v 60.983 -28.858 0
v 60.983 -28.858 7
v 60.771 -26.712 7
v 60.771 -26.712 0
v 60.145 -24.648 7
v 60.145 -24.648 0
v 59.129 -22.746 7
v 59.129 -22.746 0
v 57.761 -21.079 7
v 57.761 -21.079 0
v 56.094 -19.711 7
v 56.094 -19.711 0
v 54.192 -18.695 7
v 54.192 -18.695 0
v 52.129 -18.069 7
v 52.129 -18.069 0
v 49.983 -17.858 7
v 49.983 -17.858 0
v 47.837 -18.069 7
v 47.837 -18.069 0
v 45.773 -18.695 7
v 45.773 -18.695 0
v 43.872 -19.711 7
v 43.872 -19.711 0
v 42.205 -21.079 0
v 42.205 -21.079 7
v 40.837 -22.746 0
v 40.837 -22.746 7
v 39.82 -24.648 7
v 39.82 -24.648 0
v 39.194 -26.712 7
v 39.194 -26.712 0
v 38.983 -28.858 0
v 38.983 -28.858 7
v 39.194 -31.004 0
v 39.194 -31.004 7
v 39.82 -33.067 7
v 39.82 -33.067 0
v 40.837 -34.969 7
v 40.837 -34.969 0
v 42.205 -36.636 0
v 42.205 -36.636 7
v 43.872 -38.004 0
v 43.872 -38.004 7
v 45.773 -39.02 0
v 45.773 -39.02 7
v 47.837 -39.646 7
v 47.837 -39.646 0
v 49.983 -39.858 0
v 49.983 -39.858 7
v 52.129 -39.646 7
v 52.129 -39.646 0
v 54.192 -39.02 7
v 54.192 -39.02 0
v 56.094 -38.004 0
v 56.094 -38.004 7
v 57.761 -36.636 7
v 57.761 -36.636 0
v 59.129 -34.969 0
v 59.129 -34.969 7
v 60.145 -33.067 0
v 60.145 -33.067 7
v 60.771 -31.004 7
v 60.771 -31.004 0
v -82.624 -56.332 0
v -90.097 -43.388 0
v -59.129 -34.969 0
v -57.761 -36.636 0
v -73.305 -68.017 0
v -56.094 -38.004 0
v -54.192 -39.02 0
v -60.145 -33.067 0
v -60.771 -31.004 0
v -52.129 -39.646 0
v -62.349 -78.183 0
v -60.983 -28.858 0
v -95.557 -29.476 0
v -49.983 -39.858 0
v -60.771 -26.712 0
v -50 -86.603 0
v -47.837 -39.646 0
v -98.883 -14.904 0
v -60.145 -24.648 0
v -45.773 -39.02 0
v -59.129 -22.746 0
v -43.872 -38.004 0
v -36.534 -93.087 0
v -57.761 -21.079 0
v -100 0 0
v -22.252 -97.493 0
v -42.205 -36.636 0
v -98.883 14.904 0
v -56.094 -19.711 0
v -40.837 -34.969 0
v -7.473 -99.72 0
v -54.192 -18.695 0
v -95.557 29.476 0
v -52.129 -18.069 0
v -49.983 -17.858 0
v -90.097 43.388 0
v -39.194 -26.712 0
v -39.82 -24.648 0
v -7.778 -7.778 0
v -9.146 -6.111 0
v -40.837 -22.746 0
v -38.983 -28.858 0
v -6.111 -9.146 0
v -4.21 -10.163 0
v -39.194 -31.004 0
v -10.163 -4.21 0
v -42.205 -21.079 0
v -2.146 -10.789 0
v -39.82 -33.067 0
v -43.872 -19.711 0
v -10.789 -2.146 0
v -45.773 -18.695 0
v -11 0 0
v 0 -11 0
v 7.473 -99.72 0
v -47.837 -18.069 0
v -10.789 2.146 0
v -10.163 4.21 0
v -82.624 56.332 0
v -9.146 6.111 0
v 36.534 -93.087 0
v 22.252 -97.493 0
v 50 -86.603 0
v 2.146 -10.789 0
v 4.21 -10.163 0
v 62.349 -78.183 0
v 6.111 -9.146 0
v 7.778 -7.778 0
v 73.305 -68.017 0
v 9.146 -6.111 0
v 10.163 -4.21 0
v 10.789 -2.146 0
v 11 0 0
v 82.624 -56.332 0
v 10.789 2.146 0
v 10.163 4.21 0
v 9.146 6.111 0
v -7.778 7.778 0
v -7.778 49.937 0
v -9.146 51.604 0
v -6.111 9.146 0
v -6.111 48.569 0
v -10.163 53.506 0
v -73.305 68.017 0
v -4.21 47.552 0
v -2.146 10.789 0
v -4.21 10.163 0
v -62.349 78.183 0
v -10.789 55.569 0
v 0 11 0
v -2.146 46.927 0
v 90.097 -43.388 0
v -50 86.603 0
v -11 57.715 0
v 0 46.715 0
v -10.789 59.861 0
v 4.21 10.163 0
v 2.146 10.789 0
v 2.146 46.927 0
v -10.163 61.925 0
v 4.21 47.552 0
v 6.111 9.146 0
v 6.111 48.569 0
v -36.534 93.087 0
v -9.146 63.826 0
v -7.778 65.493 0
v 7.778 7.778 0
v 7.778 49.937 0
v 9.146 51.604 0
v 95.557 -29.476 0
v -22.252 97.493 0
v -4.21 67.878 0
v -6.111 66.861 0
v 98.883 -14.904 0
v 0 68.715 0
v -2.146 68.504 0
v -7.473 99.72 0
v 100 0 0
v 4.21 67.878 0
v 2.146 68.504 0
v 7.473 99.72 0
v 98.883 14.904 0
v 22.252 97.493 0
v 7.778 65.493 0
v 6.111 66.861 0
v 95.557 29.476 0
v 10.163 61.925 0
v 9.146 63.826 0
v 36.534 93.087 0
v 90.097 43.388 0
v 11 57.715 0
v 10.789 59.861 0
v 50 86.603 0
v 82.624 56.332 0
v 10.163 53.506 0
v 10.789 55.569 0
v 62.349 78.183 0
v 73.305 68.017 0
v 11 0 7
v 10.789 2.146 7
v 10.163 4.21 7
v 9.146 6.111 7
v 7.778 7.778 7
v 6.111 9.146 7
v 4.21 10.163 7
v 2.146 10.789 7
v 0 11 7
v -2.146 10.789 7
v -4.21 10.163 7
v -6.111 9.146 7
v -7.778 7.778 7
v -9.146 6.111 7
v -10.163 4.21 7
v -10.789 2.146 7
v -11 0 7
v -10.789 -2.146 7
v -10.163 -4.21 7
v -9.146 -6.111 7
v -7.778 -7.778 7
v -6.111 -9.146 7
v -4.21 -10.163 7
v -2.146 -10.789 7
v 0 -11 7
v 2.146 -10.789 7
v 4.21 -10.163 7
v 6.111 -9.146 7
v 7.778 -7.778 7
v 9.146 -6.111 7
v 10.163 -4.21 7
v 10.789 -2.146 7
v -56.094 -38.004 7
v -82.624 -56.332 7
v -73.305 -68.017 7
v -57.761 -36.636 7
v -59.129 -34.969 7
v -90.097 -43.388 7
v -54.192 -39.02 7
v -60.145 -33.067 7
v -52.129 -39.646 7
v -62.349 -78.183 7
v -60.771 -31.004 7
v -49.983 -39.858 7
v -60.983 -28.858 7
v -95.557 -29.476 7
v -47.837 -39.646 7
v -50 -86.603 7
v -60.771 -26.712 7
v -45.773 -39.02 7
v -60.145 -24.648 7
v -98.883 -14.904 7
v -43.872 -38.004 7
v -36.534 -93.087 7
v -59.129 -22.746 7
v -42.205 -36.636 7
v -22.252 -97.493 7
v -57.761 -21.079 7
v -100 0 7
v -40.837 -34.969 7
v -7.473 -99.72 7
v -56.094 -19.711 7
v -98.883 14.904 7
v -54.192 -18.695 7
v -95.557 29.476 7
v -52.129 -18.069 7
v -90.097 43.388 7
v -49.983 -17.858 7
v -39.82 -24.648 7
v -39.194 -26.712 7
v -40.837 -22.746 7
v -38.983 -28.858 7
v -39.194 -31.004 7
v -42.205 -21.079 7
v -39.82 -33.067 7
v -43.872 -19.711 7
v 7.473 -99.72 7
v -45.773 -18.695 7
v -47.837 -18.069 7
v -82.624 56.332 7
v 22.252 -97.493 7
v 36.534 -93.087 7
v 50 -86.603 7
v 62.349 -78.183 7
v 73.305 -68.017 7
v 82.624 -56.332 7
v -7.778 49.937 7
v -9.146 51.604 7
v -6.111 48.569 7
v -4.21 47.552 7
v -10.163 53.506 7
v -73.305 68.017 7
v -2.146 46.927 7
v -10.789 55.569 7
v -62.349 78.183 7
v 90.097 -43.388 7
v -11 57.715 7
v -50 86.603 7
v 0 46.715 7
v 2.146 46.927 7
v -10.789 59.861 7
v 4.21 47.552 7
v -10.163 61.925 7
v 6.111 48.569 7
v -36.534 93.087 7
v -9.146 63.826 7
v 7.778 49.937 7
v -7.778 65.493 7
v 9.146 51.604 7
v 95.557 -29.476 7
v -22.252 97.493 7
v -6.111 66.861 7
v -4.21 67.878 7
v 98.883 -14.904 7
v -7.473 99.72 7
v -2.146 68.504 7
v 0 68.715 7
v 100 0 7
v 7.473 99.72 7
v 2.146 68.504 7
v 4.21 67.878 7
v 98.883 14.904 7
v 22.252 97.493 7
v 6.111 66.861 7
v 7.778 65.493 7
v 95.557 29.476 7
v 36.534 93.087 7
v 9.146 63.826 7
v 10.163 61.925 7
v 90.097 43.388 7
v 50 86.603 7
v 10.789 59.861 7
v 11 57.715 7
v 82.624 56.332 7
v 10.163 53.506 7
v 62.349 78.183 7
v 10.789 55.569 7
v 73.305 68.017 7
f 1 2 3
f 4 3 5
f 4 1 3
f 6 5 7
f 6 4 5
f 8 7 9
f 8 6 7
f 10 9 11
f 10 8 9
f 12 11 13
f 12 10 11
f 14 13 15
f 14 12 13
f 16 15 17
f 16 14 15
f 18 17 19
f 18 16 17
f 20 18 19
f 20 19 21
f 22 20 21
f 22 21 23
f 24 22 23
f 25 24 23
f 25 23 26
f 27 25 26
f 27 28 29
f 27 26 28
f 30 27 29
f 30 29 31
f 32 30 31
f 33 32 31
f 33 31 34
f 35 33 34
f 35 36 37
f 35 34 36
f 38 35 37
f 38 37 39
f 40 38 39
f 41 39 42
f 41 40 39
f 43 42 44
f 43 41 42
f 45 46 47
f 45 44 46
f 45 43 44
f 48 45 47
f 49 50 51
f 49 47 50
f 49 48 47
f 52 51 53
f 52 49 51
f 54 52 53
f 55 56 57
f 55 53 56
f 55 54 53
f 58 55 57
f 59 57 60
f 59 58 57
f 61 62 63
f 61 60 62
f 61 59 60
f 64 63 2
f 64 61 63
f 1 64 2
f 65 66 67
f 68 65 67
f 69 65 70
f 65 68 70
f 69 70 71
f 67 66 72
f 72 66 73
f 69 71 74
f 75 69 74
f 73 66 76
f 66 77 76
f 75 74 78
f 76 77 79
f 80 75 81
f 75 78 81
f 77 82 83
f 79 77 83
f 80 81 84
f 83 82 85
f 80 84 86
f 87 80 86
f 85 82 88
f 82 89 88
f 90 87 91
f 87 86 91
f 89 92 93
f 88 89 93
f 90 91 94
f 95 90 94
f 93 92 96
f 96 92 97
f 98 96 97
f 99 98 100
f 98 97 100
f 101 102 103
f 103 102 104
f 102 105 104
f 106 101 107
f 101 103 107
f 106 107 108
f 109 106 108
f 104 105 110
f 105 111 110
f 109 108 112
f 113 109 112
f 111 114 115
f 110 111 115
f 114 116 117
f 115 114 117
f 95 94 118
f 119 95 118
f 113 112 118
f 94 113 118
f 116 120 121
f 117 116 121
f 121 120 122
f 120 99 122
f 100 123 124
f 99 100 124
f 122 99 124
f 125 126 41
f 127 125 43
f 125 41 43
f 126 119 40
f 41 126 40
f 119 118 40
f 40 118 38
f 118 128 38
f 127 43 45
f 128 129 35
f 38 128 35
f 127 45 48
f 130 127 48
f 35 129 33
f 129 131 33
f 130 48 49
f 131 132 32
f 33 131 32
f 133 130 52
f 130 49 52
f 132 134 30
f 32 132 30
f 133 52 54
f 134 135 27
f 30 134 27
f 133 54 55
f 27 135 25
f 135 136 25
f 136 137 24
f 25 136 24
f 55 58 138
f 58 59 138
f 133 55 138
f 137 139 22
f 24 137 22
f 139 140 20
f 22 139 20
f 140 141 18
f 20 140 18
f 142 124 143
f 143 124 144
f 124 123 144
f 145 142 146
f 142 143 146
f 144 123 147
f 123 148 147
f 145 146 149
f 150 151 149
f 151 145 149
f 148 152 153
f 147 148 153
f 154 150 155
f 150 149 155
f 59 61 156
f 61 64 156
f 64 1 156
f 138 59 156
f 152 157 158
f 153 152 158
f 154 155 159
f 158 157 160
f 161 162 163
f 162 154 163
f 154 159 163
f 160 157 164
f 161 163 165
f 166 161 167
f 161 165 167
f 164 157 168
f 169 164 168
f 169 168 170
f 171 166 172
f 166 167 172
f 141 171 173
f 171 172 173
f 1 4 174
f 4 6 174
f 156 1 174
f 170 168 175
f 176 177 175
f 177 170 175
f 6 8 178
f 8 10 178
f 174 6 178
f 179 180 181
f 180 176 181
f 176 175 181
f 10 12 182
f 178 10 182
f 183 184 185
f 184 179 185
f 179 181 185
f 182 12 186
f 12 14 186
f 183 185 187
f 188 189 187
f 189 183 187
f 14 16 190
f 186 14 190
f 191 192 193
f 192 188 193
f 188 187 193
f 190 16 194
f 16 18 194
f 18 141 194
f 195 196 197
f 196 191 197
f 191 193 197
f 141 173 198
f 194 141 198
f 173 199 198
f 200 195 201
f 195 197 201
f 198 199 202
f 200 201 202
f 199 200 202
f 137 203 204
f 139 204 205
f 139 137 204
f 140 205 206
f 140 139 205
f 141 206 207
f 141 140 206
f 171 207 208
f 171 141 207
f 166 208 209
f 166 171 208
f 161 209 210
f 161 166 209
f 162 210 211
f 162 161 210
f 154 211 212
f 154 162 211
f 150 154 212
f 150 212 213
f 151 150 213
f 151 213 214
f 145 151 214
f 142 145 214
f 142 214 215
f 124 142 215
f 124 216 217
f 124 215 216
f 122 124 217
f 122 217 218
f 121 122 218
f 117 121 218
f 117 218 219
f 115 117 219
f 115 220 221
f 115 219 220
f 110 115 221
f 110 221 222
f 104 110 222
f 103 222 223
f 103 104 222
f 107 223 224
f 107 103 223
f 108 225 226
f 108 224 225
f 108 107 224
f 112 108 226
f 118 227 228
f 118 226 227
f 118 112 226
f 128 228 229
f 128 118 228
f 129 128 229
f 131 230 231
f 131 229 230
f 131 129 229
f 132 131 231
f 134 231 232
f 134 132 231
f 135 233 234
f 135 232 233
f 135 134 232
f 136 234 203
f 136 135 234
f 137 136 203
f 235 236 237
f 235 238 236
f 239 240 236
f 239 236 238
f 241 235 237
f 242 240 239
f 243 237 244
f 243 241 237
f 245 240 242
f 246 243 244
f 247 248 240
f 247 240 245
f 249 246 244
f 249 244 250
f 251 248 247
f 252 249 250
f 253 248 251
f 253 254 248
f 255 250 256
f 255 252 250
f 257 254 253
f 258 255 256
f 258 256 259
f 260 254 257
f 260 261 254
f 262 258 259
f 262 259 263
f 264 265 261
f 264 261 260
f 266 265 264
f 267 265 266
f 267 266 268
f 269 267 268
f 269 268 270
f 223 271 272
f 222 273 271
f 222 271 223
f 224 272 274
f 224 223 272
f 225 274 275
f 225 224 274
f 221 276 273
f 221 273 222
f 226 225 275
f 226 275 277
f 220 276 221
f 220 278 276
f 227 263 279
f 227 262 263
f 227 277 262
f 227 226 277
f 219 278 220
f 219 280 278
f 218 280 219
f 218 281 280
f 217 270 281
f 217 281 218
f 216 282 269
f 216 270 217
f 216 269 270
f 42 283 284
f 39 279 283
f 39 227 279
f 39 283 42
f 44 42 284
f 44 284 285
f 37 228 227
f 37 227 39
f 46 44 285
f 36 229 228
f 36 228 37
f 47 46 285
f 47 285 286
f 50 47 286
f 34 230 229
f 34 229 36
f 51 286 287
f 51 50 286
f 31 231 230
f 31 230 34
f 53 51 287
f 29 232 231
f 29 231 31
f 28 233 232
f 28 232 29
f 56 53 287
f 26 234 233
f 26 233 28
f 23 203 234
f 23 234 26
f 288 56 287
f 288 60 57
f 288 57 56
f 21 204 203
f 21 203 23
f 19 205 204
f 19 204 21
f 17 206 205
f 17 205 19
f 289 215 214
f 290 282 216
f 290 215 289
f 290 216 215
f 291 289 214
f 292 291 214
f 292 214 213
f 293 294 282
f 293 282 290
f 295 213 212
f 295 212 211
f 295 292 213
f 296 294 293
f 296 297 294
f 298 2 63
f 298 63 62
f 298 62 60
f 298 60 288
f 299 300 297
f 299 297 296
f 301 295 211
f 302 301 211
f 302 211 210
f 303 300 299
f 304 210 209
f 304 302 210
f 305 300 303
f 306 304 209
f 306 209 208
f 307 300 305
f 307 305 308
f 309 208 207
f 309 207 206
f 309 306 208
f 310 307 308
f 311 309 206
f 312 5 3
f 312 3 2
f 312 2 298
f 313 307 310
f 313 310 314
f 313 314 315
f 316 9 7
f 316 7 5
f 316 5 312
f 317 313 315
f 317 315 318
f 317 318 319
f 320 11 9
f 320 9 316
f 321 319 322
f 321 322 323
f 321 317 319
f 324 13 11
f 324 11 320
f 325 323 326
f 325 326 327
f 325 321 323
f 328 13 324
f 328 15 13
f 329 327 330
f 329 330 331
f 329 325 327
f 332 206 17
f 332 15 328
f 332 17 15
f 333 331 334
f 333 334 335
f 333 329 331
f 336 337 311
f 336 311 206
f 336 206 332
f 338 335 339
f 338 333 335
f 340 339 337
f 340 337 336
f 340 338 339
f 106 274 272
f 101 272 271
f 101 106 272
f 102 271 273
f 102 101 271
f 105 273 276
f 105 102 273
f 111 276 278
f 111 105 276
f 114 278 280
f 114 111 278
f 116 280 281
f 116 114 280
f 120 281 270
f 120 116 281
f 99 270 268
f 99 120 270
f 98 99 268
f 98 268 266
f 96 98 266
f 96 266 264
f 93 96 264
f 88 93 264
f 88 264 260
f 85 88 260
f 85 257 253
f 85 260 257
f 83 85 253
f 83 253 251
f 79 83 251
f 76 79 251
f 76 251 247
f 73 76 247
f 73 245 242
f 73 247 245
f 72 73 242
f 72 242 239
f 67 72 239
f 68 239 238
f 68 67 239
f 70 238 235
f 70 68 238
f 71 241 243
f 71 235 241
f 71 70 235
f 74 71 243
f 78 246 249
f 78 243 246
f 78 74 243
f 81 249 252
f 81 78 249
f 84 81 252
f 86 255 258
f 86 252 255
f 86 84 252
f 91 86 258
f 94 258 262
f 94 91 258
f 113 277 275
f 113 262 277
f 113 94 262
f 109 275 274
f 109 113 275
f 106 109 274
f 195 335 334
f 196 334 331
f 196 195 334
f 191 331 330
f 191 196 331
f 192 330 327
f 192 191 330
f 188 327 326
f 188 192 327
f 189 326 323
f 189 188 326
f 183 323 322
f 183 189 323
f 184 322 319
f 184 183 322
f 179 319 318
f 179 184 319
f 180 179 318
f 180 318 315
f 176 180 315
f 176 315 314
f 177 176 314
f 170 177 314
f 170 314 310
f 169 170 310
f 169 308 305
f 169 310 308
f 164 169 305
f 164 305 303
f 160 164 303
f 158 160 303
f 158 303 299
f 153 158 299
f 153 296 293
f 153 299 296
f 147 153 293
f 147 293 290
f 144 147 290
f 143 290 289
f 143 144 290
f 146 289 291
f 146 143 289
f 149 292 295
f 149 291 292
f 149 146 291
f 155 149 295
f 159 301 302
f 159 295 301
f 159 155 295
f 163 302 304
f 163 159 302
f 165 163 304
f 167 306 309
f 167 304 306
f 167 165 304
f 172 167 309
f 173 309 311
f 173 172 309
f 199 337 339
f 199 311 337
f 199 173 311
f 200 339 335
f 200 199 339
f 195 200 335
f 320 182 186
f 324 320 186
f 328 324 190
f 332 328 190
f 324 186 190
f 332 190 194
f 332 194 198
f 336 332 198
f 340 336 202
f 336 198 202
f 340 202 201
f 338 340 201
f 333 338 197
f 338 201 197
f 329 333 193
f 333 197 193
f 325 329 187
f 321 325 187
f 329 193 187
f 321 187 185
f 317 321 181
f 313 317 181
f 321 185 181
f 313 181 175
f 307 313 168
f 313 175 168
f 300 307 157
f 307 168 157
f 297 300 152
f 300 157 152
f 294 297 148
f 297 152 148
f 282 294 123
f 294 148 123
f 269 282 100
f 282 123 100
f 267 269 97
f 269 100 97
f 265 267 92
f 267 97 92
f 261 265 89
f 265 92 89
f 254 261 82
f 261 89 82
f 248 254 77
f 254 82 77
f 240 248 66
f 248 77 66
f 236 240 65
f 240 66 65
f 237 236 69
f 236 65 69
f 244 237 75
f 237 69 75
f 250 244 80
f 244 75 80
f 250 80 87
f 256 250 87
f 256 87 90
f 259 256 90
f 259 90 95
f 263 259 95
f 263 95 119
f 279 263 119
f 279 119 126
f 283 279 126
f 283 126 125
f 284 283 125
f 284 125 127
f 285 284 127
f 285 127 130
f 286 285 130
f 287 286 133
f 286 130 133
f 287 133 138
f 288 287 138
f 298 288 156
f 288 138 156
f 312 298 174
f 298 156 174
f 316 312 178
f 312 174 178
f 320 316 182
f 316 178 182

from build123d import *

# Parameters (mm, degrees)
F0_R     = 100
F1_DEPTH = 7
F2_R     = 11
F3_DEPTH = 25


with BuildPart() as f1:
    # F0 (on Top) → F1 (new body)
    with BuildSketch(Plane.XY):
        Circle(F0_R)
    extrude(amount=F1_DEPTH)

    # F2 (on Top) → F3 (cut)
    with BuildSketch(Plane.XY):
        Circle(F2_R)
        with Locations((0, 57.71517)):
            Circle(F2_R)
        with Locations((-49.982803, -28.857585)):
            Circle(F2_R)
        with Locations((49.982803, -28.857585)):
            Circle(F2_R)
    extrude(amount=F3_DEPTH, mode=Mode.SUBTRACT)


solid = f1.part
